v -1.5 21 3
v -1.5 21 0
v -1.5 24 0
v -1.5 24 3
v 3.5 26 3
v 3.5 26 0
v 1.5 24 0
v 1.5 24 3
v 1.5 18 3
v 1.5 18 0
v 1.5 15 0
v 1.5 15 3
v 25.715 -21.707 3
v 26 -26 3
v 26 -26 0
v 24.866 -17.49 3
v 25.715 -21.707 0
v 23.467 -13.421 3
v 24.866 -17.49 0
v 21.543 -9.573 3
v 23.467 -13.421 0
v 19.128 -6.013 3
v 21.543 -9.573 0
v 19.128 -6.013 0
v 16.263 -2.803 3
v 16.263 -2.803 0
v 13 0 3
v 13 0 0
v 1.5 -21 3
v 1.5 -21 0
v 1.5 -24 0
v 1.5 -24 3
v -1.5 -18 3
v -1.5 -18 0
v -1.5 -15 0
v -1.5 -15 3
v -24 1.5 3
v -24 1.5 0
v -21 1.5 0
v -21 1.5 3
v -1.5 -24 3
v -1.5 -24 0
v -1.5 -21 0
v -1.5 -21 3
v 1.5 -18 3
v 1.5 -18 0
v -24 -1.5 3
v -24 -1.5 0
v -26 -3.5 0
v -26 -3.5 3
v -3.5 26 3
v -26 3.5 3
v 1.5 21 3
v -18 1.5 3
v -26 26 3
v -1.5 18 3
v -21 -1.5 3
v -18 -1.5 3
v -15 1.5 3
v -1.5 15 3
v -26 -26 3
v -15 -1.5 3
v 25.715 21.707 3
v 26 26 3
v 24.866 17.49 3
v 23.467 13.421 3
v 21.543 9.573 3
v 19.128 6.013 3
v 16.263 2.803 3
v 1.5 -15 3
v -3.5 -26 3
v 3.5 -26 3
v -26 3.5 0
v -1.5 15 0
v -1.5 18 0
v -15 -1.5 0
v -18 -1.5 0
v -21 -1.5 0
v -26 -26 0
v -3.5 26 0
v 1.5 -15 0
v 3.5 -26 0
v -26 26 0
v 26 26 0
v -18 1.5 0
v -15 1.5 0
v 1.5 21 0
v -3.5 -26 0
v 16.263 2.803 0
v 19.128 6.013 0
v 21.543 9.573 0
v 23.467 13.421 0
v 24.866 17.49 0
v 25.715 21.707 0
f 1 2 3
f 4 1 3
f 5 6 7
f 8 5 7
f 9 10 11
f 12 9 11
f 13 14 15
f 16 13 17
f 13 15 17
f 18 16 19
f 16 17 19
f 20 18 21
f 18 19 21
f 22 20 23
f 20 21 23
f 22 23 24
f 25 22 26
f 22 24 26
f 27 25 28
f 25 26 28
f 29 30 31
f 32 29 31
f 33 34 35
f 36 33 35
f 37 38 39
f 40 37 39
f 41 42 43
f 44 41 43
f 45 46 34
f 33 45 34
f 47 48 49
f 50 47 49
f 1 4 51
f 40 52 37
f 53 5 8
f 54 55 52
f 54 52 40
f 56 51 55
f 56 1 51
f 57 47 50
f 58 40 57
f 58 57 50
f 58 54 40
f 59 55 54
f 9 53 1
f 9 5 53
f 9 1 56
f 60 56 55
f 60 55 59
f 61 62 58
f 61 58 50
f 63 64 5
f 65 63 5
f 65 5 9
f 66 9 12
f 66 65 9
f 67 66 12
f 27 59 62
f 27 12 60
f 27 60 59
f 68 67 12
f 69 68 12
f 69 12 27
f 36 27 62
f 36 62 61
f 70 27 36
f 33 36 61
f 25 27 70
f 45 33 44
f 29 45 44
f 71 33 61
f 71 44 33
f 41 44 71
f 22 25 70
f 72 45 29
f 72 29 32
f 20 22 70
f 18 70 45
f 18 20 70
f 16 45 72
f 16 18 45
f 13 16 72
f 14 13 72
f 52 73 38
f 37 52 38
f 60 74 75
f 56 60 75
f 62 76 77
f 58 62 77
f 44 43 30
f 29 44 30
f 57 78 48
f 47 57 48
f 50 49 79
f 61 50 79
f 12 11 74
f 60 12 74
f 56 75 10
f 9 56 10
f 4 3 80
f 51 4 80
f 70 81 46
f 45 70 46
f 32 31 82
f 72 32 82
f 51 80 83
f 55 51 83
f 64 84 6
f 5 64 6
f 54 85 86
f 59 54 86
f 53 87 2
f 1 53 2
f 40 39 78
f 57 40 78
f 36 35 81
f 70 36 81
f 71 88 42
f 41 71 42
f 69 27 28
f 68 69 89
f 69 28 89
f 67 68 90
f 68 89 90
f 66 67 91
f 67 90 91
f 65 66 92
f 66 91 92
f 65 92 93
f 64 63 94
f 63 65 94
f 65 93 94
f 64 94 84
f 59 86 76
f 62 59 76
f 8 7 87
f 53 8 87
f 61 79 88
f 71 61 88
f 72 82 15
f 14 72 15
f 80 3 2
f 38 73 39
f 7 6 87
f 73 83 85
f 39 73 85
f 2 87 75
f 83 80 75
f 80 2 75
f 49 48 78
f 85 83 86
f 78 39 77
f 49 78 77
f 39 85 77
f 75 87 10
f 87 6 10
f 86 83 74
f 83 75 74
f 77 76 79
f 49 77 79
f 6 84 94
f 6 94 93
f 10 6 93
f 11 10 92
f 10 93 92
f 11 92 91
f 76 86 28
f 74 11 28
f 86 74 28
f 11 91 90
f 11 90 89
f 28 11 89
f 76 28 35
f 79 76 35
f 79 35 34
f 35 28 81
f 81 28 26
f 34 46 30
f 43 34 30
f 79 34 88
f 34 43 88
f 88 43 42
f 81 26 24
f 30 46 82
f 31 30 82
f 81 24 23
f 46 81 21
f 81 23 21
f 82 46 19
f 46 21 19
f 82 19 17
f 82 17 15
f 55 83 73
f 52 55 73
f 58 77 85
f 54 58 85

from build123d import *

# Parameters (mm, degrees)
BOSS_EXTRUDE1_DEPTH = 3
CIRPATTERN1_COUNT   = 4
CUT_EXTRUDE1_REACH  = 5


with BuildPart() as part:
    # Sketch1 → Boss-Extrude1 (new body)
    with BuildSketch(Plane.XY):
        Polygon((3.5, 26), (1.5, 24), (1.5, 21), (0, 21), (0, 18), (1.5, 18), (1.5, 15), (0, 15), (0, 12), (0, 9), (0, 6), (0, 3), (0, 0), (3, 0), (6, 0), (9, 0), (12, 0), (15, 0), (15, 1.5), (18, 1.5), (18, 0), (21, 0), (21, 1.5), (24, 1.5), (26, 3.5), (26, 26), align=None)
    boss_extrude1 = extrude(amount=BOSS_EXTRUDE1_DEPTH)

    # CirPattern1: Boss-Extrude1 ×4 about axis
    cirpattern1_axis = Axis((0, 0, 0), (0, 0, 1))
    for i in range(1, CIRPATTERN1_COUNT):
        add(boss_extrude1.rotate(cirpattern1_axis, i * 360 / CIRPATTERN1_COUNT))

    # Sketch2 → Cut-Extrude1 (cut, up to next)
    with BuildSketch(Plane.XY, mode=Mode.PRIVATE) as cut_extrude1_sk1:
        with BuildLine():
            Line((26, 26), (36, 26))
            Line((36, 26), (36, -26))
            Line((36, -26), (26, -26))
            ThreePointArc((26, -26), (22.568883707, -11.465558146), (13, 0))
            ThreePointArc((13, 0), (22.568883707, 11.465558146), (26, 26))
        make_face()
    cut_extrude1_tool1 = extrude(cut_extrude1_sk1.sketch, amount=CUT_EXTRUDE1_REACH, mode=Mode.PRIVATE) & part.part
    add(cut_extrude1_tool1.solids().sort_by_distance((28.547836, 0, 0))[0], mode=Mode.SUBTRACT)


solid = part.part
